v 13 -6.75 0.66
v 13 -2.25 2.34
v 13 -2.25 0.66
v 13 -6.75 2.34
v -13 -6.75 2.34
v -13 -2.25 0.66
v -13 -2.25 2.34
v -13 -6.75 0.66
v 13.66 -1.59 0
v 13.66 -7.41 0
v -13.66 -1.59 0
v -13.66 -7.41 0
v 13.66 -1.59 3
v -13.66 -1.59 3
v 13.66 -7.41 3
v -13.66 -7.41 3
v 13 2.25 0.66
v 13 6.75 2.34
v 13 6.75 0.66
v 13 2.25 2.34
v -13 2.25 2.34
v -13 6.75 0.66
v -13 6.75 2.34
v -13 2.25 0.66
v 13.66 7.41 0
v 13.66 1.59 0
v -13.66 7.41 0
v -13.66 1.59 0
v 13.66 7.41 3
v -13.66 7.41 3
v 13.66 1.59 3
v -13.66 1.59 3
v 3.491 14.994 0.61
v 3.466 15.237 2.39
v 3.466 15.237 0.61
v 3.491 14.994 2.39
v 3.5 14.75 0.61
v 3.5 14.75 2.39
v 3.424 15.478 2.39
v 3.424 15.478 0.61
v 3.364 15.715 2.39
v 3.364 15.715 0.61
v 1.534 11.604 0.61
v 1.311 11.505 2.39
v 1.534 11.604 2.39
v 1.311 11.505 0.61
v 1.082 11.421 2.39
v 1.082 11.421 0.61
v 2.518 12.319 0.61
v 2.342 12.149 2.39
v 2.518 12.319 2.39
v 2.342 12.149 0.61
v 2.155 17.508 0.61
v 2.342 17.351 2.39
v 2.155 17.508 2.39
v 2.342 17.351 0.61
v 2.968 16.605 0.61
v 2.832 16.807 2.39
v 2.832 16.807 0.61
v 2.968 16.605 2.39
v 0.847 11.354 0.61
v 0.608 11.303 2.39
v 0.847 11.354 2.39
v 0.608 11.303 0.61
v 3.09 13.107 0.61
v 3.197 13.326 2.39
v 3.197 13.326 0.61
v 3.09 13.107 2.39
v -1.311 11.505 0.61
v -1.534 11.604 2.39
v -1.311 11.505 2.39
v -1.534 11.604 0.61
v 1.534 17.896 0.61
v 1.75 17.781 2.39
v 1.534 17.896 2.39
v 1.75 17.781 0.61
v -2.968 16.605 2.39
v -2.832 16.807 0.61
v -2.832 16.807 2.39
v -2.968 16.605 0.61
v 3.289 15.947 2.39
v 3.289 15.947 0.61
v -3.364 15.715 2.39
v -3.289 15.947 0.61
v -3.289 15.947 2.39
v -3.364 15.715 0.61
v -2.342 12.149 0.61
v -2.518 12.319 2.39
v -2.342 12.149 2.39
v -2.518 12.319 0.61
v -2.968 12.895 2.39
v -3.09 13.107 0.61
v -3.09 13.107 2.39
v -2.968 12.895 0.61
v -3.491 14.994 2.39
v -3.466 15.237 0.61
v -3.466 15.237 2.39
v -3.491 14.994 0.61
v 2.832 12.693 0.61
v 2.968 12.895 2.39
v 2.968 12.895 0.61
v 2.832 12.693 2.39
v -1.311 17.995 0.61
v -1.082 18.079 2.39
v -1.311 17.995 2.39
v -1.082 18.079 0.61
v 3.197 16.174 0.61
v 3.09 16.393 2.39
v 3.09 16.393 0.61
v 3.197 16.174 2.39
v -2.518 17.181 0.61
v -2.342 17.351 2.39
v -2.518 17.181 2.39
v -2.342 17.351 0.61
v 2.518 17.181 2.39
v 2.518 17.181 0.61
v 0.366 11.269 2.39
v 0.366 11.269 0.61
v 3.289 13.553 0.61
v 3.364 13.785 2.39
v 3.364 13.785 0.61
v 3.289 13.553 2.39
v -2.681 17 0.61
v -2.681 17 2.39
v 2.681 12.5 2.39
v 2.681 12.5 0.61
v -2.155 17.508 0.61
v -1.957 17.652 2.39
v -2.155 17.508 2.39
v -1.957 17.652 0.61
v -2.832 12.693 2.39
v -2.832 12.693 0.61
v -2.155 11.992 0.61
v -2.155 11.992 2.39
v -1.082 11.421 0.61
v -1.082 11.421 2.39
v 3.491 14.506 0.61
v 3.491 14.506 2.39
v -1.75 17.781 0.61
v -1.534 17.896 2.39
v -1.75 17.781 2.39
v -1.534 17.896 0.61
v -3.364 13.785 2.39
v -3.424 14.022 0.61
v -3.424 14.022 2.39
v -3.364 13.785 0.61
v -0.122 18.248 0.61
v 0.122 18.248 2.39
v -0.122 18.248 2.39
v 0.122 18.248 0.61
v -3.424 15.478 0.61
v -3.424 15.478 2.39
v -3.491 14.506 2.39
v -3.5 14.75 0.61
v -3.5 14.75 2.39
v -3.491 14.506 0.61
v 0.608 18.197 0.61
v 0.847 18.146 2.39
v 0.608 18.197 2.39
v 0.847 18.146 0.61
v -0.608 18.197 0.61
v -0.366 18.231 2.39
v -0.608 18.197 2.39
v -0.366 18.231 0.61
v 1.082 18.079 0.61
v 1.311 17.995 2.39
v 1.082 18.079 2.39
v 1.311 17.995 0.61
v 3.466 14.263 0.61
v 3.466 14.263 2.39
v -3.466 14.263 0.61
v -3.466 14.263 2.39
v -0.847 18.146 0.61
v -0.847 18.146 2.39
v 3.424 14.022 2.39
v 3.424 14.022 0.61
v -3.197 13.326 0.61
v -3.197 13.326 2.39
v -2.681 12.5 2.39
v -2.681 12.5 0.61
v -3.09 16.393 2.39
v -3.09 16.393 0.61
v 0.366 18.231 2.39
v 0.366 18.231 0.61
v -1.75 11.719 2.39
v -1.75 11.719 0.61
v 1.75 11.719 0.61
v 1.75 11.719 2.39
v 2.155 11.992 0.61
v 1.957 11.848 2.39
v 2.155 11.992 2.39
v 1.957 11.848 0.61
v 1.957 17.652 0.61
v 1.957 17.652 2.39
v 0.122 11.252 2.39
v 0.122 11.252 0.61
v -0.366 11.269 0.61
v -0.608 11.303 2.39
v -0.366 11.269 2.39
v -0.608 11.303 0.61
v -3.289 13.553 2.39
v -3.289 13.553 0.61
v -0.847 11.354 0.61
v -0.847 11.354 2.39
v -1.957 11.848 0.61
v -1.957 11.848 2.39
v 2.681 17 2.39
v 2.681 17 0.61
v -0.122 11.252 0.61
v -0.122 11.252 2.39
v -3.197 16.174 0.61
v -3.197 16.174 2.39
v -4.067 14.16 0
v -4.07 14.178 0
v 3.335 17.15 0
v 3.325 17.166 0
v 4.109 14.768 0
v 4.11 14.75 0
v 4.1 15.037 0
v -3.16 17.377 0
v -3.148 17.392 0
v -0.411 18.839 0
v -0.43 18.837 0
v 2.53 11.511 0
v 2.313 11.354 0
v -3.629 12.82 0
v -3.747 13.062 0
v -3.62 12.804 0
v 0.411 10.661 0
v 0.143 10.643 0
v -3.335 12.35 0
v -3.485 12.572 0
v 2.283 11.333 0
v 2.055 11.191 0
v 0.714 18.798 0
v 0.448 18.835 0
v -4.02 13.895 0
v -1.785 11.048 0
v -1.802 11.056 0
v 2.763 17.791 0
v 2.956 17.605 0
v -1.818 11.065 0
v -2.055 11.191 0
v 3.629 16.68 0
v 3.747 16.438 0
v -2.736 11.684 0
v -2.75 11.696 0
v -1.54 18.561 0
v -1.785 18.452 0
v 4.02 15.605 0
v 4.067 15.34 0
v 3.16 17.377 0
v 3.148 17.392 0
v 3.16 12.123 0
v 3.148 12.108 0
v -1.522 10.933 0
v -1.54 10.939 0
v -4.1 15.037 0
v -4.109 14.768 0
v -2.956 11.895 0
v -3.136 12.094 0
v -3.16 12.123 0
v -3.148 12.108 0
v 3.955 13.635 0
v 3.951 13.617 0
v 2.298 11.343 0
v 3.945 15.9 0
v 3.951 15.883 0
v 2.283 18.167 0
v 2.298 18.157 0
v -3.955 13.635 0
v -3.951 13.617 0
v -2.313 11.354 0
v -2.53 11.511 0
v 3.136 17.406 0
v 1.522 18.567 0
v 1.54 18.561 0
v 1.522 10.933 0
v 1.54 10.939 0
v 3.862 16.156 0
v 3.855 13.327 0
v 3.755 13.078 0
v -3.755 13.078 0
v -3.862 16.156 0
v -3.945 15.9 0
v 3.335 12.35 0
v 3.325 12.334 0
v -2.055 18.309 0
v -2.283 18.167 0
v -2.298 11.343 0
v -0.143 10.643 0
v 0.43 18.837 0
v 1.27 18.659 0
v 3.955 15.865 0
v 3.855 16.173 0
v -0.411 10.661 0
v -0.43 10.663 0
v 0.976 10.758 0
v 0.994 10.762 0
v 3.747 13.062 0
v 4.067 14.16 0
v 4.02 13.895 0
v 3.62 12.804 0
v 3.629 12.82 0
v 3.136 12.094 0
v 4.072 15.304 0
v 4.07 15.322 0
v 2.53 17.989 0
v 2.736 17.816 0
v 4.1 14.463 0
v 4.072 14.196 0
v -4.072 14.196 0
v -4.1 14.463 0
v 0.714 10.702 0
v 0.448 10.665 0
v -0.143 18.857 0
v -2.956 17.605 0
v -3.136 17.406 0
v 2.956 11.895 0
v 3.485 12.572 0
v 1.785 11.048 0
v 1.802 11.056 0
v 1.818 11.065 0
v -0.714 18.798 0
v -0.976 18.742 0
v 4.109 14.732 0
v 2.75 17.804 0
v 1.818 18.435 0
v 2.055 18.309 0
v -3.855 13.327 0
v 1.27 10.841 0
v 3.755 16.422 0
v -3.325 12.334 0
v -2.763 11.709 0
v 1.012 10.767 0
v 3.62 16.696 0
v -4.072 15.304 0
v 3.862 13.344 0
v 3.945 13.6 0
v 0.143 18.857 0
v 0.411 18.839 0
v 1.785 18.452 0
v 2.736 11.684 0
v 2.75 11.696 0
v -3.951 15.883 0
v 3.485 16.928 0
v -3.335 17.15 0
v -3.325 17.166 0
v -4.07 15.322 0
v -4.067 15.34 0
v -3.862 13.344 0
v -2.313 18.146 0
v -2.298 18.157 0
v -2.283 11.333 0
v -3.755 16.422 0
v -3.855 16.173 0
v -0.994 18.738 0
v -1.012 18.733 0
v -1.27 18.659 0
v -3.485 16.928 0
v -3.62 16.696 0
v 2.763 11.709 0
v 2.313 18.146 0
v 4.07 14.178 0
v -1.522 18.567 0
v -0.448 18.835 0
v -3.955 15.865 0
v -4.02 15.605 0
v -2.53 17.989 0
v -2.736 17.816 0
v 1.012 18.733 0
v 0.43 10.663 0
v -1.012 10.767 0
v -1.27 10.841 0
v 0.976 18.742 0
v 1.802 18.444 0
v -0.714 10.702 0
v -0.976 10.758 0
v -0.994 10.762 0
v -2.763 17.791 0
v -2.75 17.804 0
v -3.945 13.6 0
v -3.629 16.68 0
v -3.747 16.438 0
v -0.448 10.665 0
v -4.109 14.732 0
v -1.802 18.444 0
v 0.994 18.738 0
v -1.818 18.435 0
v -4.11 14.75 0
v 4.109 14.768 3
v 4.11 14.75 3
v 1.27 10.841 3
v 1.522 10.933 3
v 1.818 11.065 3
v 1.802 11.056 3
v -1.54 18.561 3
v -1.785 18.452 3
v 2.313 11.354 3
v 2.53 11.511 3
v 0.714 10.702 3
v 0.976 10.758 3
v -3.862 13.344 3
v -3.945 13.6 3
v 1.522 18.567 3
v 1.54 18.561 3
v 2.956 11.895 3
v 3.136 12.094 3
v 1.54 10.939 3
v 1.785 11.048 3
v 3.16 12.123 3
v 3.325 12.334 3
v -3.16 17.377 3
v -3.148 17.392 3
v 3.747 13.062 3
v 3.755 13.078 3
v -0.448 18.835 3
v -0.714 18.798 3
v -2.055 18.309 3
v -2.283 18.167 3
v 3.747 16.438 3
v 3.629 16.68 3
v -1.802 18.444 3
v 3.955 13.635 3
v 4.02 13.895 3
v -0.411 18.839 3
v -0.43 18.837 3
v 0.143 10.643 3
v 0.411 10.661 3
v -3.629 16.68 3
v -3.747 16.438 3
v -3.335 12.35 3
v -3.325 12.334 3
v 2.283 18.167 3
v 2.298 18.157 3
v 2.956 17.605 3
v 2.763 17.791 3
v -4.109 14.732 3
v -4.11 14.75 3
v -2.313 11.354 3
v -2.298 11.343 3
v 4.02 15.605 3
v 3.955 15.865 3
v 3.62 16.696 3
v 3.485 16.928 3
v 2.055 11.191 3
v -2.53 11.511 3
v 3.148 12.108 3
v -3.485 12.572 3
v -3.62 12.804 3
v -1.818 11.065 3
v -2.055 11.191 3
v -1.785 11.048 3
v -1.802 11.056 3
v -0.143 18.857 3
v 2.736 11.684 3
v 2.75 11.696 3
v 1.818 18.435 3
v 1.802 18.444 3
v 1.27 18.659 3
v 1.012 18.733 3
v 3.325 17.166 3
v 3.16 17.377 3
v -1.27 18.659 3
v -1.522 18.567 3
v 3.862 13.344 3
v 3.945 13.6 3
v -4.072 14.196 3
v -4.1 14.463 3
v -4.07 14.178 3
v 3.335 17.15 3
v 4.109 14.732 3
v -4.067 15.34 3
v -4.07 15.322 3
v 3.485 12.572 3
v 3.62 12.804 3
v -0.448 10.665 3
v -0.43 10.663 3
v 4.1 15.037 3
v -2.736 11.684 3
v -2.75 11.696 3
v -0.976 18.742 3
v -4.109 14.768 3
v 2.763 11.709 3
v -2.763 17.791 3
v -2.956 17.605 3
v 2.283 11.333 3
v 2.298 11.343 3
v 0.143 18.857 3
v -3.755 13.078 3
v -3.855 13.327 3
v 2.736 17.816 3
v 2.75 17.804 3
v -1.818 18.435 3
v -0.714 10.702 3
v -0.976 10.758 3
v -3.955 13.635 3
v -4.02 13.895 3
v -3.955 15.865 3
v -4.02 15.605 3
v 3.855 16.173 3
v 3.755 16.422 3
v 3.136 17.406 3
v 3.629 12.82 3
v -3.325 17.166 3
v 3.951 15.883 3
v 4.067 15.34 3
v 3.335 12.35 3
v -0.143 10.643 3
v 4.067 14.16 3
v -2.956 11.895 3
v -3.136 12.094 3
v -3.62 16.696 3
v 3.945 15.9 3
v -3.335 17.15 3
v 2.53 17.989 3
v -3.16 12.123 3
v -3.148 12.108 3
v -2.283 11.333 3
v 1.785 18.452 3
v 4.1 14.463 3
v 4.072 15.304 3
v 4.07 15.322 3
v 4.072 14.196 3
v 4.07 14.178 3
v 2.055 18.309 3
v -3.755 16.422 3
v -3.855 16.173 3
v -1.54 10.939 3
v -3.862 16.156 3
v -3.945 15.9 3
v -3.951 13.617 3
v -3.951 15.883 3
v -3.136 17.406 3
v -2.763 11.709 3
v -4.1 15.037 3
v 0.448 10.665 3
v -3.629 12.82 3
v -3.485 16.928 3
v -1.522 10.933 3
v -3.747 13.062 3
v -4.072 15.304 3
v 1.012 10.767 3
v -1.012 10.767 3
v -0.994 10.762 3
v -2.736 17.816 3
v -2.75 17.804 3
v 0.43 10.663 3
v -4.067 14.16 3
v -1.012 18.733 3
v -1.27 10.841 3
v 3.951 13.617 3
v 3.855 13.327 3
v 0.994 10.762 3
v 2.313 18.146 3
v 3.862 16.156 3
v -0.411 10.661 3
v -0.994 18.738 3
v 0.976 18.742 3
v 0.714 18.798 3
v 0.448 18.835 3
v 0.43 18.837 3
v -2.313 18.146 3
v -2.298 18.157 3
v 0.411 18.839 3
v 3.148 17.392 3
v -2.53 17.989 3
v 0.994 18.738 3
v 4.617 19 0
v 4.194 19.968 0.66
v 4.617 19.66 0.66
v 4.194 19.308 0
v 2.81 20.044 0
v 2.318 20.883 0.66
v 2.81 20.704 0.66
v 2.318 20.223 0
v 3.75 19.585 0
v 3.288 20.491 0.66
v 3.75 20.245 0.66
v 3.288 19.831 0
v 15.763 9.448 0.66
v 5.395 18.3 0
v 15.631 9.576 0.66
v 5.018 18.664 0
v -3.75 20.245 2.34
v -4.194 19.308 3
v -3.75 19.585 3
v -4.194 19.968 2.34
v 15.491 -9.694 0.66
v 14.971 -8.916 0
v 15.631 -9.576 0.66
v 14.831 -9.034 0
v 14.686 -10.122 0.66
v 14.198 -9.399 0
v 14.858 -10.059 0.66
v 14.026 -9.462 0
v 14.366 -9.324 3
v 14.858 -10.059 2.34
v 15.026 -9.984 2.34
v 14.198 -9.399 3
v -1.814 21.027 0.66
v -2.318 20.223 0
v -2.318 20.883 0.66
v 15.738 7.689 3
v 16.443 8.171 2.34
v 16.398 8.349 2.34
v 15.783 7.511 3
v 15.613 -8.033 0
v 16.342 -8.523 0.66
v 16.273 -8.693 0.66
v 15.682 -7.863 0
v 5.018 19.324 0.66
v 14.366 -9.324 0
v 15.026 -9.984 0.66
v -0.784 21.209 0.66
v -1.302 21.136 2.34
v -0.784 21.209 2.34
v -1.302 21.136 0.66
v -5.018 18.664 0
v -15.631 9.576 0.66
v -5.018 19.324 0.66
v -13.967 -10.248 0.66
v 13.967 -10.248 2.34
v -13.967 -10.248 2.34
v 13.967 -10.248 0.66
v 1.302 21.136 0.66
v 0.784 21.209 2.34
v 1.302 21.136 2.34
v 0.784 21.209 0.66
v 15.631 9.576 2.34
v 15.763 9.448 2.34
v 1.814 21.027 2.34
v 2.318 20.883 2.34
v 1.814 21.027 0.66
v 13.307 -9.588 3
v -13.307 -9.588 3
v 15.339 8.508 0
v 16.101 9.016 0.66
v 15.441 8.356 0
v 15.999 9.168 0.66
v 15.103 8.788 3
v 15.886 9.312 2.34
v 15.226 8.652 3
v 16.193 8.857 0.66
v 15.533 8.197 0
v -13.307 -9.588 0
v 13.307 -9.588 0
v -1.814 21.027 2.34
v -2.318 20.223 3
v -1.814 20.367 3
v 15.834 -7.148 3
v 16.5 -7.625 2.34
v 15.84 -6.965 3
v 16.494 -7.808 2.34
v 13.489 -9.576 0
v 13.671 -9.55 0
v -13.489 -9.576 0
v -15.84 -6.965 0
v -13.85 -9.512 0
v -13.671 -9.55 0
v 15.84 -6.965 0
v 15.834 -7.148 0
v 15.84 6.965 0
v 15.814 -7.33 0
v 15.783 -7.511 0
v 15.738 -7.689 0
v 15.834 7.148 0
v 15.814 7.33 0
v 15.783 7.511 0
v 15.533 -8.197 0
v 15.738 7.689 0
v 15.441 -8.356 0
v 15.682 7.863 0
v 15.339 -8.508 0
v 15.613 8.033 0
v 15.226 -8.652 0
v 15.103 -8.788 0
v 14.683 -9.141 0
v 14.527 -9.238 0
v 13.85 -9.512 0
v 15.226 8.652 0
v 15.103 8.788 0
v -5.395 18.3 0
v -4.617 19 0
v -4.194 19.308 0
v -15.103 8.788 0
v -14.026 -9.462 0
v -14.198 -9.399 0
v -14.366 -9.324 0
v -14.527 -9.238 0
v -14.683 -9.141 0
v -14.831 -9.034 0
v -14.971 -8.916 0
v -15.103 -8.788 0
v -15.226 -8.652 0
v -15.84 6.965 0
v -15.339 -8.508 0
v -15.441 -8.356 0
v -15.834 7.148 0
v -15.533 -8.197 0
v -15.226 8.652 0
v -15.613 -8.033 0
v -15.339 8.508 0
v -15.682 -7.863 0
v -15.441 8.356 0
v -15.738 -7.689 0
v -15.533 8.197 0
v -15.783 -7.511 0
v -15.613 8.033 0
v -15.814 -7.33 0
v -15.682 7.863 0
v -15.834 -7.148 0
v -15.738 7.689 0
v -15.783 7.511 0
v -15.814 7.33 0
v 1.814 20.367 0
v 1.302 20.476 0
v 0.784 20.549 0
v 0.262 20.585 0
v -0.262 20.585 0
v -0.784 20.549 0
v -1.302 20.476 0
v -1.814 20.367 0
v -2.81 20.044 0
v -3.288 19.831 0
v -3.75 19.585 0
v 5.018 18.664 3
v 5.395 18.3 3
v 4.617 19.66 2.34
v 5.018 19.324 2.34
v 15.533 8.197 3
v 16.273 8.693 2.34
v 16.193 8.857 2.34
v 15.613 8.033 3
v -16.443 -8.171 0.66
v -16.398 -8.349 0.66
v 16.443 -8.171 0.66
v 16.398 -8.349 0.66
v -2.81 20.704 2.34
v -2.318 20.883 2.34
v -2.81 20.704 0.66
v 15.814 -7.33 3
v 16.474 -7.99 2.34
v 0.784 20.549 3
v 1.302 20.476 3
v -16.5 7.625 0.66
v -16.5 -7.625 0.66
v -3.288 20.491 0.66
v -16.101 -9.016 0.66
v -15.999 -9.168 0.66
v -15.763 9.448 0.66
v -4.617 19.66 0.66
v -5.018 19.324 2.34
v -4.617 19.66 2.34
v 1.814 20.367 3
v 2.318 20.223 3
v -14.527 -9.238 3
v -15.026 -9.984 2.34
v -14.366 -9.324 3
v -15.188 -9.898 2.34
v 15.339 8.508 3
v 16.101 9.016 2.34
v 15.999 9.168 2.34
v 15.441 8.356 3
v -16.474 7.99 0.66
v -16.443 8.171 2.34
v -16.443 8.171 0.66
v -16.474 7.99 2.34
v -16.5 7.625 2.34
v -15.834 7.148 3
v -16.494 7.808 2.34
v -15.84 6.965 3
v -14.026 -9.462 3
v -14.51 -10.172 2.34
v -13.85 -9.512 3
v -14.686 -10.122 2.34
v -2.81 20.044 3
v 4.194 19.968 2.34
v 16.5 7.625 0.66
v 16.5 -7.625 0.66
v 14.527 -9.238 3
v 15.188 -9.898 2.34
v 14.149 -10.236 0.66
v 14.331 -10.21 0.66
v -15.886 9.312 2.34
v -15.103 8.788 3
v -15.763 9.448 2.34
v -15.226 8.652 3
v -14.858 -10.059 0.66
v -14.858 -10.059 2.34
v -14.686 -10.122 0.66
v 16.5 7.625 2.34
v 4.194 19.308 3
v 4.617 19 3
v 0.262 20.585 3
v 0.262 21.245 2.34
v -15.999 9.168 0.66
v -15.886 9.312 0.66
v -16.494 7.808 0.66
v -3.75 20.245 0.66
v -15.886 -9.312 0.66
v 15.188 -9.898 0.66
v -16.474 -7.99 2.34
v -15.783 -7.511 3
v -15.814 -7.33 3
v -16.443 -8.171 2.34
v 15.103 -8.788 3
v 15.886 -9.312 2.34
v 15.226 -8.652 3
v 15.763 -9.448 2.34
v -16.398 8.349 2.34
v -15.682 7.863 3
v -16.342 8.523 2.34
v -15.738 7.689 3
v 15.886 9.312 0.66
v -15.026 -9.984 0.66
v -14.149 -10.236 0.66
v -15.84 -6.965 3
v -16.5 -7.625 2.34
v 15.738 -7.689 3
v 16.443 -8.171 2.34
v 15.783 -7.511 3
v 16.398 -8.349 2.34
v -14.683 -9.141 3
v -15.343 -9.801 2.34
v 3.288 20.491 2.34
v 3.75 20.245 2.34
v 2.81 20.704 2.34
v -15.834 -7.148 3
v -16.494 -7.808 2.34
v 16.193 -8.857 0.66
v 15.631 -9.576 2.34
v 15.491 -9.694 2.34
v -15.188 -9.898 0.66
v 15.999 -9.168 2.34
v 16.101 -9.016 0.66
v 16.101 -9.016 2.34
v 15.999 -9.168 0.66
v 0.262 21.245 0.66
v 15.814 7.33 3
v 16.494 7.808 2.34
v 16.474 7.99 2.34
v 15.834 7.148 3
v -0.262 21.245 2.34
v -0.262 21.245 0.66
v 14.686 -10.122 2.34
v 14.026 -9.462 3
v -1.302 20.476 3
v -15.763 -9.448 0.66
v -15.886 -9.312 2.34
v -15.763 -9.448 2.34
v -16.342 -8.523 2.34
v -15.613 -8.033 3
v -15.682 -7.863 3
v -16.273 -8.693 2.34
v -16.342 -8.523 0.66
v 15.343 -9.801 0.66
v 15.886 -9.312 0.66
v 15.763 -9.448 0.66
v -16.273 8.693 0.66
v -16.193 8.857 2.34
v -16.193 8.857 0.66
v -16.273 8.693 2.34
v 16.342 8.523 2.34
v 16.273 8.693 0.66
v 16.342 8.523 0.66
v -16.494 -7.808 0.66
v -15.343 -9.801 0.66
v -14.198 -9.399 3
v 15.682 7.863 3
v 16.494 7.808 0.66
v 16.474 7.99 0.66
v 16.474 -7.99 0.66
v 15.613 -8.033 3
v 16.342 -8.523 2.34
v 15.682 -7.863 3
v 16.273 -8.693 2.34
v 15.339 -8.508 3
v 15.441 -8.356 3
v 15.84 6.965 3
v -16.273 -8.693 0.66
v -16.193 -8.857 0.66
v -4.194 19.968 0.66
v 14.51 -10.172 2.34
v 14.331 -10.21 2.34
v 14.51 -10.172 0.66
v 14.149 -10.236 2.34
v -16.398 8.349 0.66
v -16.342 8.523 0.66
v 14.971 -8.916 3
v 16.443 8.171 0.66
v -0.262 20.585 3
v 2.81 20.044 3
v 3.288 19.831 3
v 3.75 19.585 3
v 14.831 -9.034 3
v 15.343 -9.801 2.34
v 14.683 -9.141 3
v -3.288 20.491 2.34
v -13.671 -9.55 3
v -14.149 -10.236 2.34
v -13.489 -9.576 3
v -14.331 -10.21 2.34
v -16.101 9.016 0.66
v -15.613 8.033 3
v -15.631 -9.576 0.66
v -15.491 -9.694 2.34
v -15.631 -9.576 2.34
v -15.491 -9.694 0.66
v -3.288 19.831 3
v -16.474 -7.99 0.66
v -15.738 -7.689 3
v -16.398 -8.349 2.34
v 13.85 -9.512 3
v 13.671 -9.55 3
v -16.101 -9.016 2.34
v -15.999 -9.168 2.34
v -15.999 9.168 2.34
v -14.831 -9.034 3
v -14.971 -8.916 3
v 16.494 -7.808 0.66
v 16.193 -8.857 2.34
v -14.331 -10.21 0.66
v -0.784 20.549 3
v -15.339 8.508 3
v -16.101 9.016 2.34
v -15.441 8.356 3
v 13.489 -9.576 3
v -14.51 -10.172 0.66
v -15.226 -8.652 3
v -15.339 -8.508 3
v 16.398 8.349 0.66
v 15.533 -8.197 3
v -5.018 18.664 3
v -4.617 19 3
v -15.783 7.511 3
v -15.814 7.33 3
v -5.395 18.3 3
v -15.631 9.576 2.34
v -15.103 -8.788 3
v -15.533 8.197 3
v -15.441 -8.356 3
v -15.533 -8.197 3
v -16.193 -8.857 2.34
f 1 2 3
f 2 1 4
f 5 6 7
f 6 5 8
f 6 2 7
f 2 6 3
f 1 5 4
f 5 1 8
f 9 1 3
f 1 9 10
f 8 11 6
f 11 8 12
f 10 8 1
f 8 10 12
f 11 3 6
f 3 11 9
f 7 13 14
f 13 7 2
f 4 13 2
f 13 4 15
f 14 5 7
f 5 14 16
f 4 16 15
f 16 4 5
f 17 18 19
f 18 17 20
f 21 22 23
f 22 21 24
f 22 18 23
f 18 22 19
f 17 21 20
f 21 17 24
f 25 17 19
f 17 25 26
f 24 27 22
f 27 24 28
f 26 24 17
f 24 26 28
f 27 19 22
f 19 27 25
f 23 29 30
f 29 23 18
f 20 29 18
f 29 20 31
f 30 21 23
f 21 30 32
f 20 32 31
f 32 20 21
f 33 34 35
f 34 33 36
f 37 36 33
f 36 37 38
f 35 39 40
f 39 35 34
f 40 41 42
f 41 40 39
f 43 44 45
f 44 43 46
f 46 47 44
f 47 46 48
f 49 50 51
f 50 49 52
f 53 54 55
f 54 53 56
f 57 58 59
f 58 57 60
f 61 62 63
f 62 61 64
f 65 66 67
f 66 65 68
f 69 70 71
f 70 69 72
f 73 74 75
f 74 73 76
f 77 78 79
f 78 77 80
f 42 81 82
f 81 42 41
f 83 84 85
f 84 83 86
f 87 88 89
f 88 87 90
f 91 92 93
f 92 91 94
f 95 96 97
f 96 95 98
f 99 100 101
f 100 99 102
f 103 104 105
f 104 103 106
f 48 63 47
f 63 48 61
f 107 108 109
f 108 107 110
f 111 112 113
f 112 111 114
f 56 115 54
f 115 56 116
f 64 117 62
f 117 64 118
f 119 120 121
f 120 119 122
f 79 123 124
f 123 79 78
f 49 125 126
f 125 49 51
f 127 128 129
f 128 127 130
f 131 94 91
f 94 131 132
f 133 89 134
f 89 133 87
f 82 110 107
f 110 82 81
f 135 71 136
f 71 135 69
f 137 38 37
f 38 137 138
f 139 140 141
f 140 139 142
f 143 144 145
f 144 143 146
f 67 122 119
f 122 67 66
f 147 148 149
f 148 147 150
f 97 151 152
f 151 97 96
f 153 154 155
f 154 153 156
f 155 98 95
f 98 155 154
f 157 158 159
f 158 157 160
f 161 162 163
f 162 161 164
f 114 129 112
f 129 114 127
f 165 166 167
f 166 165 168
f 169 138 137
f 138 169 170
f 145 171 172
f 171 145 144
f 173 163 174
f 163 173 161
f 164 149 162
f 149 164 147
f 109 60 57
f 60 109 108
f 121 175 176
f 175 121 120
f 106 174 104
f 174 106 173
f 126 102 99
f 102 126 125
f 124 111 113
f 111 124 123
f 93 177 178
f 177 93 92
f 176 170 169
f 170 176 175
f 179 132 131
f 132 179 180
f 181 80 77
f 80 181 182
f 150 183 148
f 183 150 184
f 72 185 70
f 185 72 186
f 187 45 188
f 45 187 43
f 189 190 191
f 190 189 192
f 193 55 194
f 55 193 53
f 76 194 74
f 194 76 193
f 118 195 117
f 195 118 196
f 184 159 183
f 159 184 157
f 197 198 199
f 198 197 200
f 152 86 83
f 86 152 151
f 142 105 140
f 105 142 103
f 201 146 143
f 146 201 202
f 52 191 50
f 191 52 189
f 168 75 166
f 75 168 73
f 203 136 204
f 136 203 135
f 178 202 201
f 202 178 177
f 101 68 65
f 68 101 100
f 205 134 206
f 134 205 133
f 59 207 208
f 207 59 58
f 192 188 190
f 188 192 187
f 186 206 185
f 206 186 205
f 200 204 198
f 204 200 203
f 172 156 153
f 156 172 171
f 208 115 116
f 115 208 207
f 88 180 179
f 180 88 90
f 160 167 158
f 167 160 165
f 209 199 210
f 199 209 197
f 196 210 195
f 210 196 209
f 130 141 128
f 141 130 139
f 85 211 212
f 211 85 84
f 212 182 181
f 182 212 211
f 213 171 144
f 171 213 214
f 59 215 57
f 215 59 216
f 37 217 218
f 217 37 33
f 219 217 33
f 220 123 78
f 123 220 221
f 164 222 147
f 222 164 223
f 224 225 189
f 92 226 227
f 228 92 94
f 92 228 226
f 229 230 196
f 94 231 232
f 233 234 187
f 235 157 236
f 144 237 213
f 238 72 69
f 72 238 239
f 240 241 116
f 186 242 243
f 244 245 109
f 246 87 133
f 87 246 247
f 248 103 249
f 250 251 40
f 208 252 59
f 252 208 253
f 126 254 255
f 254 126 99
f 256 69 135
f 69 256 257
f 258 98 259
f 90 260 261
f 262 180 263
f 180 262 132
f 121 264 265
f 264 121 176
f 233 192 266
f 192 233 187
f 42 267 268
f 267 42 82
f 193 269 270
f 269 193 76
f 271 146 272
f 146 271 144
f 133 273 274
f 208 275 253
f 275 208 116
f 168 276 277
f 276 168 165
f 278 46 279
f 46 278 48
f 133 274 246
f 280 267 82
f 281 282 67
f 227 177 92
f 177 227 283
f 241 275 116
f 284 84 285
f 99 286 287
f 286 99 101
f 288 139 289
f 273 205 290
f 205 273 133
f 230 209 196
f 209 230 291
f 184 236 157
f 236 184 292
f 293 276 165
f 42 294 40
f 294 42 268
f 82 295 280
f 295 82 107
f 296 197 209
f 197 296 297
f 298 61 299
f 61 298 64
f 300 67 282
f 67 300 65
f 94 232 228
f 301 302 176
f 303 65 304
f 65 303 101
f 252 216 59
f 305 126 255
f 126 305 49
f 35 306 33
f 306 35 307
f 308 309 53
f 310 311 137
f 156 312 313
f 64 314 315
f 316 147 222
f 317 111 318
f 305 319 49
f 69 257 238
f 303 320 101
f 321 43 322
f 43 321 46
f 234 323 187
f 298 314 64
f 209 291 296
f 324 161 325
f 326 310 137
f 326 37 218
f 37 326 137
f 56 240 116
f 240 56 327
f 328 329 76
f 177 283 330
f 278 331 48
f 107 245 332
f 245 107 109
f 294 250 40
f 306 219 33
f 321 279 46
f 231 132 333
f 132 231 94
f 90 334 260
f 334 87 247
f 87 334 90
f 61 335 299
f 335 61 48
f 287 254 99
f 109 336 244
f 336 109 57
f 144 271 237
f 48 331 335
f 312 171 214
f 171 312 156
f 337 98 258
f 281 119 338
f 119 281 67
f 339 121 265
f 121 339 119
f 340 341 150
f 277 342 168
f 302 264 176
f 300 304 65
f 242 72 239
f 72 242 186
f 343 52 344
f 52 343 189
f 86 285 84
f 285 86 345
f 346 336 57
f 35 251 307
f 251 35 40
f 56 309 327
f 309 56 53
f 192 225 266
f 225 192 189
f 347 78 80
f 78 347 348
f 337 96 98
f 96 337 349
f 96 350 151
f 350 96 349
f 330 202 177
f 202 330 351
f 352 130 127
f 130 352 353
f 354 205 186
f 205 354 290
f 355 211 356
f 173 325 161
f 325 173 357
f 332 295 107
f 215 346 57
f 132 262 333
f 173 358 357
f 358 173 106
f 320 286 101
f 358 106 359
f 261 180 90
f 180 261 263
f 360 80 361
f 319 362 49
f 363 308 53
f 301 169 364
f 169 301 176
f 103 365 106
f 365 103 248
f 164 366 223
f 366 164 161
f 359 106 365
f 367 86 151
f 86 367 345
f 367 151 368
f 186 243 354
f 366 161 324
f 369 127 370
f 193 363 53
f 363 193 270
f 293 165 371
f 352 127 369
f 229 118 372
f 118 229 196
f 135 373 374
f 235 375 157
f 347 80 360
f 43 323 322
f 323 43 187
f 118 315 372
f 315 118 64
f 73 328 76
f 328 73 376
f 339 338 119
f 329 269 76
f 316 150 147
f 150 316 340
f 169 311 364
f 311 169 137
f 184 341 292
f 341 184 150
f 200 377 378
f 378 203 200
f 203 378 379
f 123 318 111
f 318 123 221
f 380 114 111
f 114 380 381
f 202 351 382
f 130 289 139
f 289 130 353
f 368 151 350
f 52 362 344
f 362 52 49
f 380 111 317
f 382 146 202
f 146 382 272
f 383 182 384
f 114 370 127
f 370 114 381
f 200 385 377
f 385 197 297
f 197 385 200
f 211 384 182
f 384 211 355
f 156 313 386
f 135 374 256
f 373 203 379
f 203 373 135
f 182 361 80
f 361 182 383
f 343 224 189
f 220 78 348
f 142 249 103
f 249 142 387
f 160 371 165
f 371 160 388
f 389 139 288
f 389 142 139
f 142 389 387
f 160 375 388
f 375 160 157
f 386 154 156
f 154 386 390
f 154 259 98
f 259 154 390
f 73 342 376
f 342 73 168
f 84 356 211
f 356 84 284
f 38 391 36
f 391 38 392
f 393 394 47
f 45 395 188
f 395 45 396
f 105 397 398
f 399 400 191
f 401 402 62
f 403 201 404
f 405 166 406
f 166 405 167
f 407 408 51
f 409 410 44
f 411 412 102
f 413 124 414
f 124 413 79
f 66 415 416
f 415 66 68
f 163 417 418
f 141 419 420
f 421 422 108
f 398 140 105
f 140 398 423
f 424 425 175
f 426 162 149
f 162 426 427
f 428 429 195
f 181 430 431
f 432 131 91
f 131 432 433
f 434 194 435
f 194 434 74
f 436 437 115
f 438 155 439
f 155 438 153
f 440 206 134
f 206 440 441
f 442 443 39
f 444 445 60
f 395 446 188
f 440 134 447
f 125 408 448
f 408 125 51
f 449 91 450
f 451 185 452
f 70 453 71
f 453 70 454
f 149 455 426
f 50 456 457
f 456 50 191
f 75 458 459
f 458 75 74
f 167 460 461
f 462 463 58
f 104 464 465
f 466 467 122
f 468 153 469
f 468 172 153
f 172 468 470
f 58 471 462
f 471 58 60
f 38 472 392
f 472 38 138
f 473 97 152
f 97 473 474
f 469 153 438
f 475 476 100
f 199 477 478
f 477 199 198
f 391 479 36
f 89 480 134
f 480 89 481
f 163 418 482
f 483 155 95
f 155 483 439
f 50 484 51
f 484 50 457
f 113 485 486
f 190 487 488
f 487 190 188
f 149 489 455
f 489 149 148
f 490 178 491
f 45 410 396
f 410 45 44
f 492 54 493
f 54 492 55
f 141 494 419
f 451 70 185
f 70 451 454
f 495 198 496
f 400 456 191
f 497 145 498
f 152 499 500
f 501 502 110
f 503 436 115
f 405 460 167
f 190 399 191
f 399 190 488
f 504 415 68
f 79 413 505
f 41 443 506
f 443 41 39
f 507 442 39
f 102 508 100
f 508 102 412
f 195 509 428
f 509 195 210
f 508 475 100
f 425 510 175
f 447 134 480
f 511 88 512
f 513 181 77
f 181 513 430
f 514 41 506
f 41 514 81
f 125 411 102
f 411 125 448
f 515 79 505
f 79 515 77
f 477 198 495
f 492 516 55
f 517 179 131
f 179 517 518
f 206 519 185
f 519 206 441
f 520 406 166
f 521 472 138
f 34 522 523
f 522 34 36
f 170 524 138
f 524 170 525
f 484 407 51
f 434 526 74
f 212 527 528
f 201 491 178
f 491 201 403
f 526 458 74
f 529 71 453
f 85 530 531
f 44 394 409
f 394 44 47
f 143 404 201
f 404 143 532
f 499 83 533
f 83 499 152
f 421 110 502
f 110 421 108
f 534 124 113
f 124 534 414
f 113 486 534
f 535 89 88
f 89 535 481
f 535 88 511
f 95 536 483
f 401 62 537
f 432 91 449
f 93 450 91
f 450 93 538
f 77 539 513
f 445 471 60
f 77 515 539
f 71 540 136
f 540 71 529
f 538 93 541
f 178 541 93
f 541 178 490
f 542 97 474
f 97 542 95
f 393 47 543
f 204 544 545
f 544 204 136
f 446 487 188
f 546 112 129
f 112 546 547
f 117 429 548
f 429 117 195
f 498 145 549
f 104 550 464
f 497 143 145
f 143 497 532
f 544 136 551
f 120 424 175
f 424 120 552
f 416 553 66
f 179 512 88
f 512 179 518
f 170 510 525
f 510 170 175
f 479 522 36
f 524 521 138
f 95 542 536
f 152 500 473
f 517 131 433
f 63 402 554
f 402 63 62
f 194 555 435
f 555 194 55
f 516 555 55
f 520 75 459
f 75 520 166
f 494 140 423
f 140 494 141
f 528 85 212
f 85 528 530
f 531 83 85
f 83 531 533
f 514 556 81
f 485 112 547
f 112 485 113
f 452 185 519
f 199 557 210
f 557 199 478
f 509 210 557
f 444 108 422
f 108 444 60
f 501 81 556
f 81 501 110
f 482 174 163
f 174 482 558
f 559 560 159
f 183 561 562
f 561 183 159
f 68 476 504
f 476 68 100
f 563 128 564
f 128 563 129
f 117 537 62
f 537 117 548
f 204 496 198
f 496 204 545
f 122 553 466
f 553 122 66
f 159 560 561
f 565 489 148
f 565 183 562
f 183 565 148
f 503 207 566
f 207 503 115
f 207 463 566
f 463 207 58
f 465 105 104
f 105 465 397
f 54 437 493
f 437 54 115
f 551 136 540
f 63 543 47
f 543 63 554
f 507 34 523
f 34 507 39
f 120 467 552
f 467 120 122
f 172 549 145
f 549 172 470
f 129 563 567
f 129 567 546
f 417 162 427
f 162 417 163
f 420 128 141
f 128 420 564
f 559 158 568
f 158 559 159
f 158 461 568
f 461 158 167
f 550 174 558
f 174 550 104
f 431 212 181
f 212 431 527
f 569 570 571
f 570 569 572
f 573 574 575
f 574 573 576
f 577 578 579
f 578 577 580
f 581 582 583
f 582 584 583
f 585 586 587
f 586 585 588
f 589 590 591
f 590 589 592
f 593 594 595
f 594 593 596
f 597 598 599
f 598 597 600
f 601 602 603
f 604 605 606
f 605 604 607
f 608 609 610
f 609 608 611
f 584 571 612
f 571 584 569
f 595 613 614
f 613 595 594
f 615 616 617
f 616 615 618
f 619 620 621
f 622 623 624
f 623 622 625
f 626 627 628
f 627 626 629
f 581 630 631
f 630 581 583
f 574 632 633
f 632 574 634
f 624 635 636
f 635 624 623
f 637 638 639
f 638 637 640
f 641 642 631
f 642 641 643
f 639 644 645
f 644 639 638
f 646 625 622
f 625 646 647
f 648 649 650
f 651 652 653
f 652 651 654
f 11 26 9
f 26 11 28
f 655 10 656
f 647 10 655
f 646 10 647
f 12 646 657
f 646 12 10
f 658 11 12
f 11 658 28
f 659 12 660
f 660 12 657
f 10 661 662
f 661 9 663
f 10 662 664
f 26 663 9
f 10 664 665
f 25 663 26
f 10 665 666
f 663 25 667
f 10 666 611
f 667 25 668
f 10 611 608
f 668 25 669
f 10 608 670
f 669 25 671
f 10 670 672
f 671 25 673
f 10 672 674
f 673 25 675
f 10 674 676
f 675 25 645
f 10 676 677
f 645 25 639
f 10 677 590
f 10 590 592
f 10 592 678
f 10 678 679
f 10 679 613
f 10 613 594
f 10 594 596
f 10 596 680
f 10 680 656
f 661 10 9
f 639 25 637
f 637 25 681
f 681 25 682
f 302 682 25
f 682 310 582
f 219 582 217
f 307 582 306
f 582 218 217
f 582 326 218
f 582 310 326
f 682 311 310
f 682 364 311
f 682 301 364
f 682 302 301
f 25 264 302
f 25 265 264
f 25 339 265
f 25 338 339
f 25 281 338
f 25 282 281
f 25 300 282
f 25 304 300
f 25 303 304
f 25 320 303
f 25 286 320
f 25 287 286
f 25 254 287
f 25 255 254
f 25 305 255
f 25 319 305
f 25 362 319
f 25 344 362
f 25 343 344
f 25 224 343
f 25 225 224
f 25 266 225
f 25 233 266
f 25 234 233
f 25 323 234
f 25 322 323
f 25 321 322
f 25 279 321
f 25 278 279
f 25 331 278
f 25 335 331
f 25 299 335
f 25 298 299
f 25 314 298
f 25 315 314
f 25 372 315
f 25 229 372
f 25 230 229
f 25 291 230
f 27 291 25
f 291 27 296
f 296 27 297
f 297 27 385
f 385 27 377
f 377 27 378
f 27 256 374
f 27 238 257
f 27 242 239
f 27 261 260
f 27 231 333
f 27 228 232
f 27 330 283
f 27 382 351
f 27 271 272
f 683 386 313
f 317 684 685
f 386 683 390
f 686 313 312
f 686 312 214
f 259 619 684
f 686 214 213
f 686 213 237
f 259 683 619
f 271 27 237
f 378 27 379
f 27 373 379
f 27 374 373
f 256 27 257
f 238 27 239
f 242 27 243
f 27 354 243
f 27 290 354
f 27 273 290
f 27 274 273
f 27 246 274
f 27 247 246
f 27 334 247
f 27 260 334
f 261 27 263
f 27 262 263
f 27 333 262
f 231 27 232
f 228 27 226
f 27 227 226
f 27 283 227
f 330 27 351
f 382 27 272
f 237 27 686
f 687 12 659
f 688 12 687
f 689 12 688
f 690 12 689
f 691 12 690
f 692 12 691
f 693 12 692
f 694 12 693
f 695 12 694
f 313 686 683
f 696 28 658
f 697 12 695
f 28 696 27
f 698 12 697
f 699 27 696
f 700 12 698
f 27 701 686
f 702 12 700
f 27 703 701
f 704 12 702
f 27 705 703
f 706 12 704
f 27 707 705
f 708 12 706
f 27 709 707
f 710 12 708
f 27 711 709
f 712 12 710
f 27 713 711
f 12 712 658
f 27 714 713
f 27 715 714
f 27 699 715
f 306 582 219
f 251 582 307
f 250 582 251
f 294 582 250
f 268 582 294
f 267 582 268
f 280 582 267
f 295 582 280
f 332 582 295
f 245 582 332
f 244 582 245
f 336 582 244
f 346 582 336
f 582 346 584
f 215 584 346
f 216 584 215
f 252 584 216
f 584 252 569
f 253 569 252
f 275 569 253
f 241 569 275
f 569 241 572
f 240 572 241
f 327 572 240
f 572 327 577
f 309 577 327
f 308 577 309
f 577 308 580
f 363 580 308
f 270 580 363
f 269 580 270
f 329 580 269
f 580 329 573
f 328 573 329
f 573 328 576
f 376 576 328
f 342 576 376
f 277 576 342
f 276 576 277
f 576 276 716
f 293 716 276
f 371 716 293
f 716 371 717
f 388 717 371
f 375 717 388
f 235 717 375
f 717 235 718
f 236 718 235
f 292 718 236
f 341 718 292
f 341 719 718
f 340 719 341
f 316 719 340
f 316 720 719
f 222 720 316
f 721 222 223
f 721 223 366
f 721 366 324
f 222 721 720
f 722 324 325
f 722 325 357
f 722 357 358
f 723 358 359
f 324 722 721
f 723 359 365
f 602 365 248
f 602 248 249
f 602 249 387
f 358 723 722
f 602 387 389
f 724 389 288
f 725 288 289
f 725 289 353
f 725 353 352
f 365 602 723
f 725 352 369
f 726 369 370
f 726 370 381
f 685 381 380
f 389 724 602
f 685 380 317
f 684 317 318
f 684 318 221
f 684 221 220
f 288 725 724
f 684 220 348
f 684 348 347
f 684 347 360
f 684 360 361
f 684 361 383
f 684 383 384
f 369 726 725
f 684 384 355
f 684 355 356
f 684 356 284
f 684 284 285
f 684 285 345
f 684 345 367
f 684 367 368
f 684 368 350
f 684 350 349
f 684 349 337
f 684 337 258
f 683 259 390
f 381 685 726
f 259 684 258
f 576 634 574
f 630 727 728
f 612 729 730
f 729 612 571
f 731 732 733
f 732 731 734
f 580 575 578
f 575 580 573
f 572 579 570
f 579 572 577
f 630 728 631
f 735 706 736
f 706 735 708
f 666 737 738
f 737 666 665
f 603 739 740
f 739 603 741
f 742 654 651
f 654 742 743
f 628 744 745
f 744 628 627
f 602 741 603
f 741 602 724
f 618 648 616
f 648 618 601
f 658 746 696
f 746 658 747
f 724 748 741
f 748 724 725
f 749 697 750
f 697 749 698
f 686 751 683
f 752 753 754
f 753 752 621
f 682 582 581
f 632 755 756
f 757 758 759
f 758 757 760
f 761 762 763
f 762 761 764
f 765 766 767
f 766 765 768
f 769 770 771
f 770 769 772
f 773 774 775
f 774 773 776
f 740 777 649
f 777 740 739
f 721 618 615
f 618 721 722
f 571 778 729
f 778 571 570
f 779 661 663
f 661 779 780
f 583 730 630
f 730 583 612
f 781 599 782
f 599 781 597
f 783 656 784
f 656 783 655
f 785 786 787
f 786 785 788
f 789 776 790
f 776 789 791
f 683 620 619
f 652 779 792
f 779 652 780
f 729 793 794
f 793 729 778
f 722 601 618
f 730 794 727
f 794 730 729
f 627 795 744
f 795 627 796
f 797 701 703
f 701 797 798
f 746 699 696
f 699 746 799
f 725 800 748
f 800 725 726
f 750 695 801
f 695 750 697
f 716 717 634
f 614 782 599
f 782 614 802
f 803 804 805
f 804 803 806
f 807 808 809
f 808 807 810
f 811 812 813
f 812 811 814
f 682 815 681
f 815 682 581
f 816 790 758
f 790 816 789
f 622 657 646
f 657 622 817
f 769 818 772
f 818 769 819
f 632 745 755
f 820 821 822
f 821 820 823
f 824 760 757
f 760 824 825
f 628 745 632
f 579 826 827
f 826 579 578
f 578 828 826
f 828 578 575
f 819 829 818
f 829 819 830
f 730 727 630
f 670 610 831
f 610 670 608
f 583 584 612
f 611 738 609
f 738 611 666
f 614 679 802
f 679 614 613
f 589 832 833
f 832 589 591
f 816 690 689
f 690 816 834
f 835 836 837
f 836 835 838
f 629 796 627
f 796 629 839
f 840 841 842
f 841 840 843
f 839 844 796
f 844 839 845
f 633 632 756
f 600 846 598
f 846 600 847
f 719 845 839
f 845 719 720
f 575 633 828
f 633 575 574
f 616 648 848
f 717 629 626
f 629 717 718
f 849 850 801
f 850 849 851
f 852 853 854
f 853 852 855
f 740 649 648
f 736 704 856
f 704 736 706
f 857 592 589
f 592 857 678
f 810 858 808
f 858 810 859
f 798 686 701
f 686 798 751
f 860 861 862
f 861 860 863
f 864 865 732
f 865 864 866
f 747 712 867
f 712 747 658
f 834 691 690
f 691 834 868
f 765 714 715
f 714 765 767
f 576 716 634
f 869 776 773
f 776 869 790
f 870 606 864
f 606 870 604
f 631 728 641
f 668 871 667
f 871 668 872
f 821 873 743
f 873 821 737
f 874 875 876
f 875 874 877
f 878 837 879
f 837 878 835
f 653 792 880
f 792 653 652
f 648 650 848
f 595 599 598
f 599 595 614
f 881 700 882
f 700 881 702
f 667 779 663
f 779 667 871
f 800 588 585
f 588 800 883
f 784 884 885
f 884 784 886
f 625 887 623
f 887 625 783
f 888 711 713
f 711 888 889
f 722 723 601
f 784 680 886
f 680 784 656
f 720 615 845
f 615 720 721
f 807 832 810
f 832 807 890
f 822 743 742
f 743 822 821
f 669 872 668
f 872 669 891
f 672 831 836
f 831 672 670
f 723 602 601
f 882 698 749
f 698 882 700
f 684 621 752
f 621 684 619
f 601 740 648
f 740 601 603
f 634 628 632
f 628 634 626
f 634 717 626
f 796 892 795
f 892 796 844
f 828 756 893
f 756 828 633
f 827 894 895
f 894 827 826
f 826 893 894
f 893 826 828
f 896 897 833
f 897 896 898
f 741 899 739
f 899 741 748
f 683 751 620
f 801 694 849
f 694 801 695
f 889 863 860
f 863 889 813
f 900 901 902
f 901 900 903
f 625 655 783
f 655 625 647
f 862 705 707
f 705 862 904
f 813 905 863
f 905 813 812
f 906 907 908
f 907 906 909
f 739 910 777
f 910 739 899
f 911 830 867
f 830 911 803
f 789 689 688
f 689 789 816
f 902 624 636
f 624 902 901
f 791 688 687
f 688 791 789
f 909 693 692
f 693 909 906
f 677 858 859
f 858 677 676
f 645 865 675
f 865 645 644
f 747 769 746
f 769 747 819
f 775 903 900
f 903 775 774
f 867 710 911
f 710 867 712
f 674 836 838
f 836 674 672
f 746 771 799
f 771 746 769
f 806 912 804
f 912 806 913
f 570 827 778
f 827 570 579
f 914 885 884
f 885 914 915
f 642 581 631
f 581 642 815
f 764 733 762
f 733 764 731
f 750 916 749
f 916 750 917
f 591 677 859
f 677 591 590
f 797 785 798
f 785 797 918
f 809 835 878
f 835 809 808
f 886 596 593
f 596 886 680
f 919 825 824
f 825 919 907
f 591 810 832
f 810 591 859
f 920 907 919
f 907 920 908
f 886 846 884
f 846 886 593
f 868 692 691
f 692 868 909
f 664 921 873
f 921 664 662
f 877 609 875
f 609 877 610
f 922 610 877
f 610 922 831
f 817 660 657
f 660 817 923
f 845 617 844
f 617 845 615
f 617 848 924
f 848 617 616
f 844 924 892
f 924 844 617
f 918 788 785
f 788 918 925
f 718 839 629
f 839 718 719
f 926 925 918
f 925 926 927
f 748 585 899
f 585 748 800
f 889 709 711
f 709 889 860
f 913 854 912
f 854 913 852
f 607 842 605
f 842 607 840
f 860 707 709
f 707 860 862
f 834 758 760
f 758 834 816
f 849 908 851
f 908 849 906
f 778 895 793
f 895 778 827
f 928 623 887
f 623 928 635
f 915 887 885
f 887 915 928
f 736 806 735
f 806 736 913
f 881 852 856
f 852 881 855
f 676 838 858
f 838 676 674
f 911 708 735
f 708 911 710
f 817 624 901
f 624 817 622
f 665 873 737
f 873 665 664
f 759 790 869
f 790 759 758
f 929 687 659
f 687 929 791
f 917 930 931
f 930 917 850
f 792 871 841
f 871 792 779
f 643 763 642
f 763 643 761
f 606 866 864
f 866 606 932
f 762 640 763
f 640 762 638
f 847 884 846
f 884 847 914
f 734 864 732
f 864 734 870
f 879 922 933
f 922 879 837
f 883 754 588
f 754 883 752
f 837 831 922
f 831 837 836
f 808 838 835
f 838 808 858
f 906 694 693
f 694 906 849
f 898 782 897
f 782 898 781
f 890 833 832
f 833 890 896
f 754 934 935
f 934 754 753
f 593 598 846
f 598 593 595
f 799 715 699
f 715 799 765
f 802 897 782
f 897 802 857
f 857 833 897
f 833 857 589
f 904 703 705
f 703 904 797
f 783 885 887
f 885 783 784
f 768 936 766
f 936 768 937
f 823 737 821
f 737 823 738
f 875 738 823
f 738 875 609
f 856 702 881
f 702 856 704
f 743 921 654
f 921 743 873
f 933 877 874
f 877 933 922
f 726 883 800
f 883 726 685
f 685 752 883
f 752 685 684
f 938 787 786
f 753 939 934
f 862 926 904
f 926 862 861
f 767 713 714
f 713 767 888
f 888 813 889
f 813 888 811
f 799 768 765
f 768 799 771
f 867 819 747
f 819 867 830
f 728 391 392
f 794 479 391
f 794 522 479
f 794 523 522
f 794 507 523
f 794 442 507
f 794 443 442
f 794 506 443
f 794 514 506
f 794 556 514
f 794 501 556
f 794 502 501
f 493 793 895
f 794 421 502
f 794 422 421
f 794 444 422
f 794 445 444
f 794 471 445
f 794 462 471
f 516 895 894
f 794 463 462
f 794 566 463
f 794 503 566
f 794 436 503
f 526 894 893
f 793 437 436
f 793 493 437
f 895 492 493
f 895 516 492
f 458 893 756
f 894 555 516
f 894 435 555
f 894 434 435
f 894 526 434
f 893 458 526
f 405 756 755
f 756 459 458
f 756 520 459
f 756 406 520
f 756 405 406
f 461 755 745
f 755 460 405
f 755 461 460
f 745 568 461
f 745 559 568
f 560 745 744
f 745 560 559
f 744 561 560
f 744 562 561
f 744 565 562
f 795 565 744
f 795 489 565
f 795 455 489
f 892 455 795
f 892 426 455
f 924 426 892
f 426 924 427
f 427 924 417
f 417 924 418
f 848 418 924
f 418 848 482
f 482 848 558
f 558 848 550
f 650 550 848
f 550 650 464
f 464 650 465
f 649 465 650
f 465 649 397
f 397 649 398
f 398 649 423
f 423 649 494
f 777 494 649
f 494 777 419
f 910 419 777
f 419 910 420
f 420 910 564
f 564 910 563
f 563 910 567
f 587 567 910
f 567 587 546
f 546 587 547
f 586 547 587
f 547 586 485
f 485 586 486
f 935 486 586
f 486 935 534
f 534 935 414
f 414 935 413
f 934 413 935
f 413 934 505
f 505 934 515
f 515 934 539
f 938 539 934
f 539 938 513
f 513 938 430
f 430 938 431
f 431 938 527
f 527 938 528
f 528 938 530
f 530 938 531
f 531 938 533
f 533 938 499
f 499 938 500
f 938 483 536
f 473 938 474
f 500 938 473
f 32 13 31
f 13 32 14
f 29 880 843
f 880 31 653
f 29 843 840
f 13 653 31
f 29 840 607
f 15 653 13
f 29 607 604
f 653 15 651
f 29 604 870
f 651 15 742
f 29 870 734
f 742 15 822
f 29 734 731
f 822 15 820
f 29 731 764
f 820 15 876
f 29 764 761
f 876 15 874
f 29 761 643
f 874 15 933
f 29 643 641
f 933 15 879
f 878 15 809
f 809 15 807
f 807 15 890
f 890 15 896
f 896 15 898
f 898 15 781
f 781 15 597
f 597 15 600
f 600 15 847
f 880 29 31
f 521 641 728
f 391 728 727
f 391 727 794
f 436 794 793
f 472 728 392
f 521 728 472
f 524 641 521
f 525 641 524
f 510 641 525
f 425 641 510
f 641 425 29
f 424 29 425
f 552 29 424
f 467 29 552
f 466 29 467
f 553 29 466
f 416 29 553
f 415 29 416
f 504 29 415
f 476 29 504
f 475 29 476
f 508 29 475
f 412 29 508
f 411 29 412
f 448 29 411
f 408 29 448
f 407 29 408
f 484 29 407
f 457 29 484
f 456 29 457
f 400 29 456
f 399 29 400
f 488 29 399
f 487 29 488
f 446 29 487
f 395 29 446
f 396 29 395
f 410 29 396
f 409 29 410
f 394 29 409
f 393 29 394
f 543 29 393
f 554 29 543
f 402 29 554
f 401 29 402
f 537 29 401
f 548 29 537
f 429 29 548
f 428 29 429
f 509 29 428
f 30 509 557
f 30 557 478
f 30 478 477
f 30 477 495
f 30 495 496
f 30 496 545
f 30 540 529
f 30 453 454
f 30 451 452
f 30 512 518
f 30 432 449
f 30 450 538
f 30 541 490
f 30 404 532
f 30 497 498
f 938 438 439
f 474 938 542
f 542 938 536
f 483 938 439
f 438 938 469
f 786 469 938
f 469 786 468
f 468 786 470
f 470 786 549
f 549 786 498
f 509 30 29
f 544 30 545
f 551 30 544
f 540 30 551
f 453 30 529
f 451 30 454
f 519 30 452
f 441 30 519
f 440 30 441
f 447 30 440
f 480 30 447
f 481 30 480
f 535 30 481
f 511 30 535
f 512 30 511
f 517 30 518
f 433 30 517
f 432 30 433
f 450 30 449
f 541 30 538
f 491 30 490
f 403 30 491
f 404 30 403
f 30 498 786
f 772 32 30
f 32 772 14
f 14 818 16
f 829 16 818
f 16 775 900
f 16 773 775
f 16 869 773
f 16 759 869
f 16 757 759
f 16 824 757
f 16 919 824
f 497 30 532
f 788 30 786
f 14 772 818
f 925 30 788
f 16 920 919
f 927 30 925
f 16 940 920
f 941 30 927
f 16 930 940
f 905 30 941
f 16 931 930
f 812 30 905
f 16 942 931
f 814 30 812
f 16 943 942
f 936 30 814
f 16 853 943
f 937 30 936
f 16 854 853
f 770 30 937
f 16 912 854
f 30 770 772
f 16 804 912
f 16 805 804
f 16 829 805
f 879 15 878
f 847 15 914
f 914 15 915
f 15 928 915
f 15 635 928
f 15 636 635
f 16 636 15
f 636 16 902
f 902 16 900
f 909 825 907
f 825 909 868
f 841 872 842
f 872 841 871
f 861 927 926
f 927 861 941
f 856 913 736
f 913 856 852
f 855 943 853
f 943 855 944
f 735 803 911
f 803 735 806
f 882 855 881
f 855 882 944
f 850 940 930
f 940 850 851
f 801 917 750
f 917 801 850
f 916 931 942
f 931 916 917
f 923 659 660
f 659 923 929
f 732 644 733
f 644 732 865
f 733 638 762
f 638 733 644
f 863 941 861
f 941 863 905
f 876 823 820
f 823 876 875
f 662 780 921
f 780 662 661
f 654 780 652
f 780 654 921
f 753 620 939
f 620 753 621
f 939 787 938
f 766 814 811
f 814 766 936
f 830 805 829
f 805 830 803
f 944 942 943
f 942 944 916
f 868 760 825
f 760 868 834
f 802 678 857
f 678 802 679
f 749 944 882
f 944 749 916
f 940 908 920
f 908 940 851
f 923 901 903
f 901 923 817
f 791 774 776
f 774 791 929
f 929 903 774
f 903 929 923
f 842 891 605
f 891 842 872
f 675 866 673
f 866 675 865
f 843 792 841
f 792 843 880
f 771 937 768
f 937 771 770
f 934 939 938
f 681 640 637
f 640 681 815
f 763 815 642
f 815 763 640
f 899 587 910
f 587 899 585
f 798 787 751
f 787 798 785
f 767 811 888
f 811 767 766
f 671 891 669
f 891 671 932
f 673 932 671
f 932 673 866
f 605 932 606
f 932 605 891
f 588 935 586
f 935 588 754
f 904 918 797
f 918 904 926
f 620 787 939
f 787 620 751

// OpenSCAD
// [FL_INDEX: keywords="openscad, 3d_parametric, Walters_Customizable_Tri_Glide_with_broken_edges_and_eyelet, csg_solid" | COT="Parametric OpenSCAD design from 3DCodeverse"]
// Title: Walters Customizable Tri Glide with broken edges and eyelet

//=== Flat Tri Glide ===//

//width of the webbing opening (1in = 25.4 mm)
_1_webbingWidth = 26;

// width of the gap for the webbing
_2_webbingGap = 4.5;

// thickness of the edge
_3_edgeThickness = 3.5;

// thickness of the center beam
_4_centerThickness = 4.5;

// height of the tri glide
_5_height = 3;

// percent corner rounding
_6_cornerRounding = 75; // [1:100]

// ho much to break off the edges
_7_cornerBreakage = 0.66;

// diameter of eyelet
_8_eyeDiameter = 7;

// thicknes of the eyelets rim
_9_eyeRimThickness = 4;




module makeBody(xsize, ysize, height, radius,edgeThickness,eyeRad,eyeRim) {
	translate([0,0,height/2]) {
		minkowski() {
			cube(size=[xsize-2*radius,ysize-2*radius, height/2], center = true);
			cylinder(r=radius, h=height/2, center=true);
		}
	}
	translate([0,ysize/2+eyeRad,0]) 
		cylinder(r=eyeRad+eyeRim,h=height);
}

module makeCuts(width, gap, thickness, height,b,eyeRad,eyeRim) {
    eps=0.05;
	offset = (thickness+gap)/2;
	for (y = [-offset, offset]) {
		translate([0, y, 0]) {

			translate([0, 0, height/2])
				cube(size=[width, gap, height*2], center=true);
			translate([0, 0, 0])
				makeCutEnd(width, gap, thickness, height,b);
			translate([0, 0, height]) scale([1,1,-1])
				makeCutEnd(width, gap, thickness, height,b);
		}
	translate([0,2*offset+gap/2 +eyeRad,-height*0.1]) 
		cylinder(r=eyeRad,h=height*1.2);
	translate([0,2*offset+gap/2 +eyeRad,-eps]) 
		cylinder(r1=eyeRad+b,r2=eyeRad,h=b);
	translate([0,2*offset+gap/2 +eyeRad,height-b+eps]) 
		cylinder(r1=eyeRad,r2=eyeRad+b,h=b);
	}
}

module makeCutEnd(width, gap, thickness, height,b)
{
	hull(){
		translate([0,0,+b/2])
			cube(size=[width, gap, b], center=true);
		translate([0,0,-b/2])
			cube(size=[width+2*b, gap+2*b, b], center=true);			
	}
}

module makeTriGlide(width, gap, edgeThickness, centerThickness, height, rounding, 
                    b, eyeDiam, eyeRim ,$fn=90) {
	xsize = width + edgeThickness * 2;
	ysize = centerThickness + edgeThickness * 2 + gap * 2;
	radius = edgeThickness*(rounding/100);
	difference() {
        hull()
        {
		  makeBody(xsize-2*b, ysize-2*b, height, radius,edgeThickness,eyeDiam/2,eyeRim);
          translate([0,0,b])
		  makeBody(xsize, ysize, height-2*b, radius,edgeThickness,eyeDiam/2,eyeRim);
        }
		makeCuts(width, gap, centerThickness, height,b,eyeDiam/2,eyeRim);
	}
}


makeTriGlide(_1_webbingWidth, _2_webbingGap, _3_edgeThickness, _4_centerThickness, _5_height, _6_cornerRounding,_7_cornerBreakage,_8_eyeDiameter,_9_eyeRimThickness);
